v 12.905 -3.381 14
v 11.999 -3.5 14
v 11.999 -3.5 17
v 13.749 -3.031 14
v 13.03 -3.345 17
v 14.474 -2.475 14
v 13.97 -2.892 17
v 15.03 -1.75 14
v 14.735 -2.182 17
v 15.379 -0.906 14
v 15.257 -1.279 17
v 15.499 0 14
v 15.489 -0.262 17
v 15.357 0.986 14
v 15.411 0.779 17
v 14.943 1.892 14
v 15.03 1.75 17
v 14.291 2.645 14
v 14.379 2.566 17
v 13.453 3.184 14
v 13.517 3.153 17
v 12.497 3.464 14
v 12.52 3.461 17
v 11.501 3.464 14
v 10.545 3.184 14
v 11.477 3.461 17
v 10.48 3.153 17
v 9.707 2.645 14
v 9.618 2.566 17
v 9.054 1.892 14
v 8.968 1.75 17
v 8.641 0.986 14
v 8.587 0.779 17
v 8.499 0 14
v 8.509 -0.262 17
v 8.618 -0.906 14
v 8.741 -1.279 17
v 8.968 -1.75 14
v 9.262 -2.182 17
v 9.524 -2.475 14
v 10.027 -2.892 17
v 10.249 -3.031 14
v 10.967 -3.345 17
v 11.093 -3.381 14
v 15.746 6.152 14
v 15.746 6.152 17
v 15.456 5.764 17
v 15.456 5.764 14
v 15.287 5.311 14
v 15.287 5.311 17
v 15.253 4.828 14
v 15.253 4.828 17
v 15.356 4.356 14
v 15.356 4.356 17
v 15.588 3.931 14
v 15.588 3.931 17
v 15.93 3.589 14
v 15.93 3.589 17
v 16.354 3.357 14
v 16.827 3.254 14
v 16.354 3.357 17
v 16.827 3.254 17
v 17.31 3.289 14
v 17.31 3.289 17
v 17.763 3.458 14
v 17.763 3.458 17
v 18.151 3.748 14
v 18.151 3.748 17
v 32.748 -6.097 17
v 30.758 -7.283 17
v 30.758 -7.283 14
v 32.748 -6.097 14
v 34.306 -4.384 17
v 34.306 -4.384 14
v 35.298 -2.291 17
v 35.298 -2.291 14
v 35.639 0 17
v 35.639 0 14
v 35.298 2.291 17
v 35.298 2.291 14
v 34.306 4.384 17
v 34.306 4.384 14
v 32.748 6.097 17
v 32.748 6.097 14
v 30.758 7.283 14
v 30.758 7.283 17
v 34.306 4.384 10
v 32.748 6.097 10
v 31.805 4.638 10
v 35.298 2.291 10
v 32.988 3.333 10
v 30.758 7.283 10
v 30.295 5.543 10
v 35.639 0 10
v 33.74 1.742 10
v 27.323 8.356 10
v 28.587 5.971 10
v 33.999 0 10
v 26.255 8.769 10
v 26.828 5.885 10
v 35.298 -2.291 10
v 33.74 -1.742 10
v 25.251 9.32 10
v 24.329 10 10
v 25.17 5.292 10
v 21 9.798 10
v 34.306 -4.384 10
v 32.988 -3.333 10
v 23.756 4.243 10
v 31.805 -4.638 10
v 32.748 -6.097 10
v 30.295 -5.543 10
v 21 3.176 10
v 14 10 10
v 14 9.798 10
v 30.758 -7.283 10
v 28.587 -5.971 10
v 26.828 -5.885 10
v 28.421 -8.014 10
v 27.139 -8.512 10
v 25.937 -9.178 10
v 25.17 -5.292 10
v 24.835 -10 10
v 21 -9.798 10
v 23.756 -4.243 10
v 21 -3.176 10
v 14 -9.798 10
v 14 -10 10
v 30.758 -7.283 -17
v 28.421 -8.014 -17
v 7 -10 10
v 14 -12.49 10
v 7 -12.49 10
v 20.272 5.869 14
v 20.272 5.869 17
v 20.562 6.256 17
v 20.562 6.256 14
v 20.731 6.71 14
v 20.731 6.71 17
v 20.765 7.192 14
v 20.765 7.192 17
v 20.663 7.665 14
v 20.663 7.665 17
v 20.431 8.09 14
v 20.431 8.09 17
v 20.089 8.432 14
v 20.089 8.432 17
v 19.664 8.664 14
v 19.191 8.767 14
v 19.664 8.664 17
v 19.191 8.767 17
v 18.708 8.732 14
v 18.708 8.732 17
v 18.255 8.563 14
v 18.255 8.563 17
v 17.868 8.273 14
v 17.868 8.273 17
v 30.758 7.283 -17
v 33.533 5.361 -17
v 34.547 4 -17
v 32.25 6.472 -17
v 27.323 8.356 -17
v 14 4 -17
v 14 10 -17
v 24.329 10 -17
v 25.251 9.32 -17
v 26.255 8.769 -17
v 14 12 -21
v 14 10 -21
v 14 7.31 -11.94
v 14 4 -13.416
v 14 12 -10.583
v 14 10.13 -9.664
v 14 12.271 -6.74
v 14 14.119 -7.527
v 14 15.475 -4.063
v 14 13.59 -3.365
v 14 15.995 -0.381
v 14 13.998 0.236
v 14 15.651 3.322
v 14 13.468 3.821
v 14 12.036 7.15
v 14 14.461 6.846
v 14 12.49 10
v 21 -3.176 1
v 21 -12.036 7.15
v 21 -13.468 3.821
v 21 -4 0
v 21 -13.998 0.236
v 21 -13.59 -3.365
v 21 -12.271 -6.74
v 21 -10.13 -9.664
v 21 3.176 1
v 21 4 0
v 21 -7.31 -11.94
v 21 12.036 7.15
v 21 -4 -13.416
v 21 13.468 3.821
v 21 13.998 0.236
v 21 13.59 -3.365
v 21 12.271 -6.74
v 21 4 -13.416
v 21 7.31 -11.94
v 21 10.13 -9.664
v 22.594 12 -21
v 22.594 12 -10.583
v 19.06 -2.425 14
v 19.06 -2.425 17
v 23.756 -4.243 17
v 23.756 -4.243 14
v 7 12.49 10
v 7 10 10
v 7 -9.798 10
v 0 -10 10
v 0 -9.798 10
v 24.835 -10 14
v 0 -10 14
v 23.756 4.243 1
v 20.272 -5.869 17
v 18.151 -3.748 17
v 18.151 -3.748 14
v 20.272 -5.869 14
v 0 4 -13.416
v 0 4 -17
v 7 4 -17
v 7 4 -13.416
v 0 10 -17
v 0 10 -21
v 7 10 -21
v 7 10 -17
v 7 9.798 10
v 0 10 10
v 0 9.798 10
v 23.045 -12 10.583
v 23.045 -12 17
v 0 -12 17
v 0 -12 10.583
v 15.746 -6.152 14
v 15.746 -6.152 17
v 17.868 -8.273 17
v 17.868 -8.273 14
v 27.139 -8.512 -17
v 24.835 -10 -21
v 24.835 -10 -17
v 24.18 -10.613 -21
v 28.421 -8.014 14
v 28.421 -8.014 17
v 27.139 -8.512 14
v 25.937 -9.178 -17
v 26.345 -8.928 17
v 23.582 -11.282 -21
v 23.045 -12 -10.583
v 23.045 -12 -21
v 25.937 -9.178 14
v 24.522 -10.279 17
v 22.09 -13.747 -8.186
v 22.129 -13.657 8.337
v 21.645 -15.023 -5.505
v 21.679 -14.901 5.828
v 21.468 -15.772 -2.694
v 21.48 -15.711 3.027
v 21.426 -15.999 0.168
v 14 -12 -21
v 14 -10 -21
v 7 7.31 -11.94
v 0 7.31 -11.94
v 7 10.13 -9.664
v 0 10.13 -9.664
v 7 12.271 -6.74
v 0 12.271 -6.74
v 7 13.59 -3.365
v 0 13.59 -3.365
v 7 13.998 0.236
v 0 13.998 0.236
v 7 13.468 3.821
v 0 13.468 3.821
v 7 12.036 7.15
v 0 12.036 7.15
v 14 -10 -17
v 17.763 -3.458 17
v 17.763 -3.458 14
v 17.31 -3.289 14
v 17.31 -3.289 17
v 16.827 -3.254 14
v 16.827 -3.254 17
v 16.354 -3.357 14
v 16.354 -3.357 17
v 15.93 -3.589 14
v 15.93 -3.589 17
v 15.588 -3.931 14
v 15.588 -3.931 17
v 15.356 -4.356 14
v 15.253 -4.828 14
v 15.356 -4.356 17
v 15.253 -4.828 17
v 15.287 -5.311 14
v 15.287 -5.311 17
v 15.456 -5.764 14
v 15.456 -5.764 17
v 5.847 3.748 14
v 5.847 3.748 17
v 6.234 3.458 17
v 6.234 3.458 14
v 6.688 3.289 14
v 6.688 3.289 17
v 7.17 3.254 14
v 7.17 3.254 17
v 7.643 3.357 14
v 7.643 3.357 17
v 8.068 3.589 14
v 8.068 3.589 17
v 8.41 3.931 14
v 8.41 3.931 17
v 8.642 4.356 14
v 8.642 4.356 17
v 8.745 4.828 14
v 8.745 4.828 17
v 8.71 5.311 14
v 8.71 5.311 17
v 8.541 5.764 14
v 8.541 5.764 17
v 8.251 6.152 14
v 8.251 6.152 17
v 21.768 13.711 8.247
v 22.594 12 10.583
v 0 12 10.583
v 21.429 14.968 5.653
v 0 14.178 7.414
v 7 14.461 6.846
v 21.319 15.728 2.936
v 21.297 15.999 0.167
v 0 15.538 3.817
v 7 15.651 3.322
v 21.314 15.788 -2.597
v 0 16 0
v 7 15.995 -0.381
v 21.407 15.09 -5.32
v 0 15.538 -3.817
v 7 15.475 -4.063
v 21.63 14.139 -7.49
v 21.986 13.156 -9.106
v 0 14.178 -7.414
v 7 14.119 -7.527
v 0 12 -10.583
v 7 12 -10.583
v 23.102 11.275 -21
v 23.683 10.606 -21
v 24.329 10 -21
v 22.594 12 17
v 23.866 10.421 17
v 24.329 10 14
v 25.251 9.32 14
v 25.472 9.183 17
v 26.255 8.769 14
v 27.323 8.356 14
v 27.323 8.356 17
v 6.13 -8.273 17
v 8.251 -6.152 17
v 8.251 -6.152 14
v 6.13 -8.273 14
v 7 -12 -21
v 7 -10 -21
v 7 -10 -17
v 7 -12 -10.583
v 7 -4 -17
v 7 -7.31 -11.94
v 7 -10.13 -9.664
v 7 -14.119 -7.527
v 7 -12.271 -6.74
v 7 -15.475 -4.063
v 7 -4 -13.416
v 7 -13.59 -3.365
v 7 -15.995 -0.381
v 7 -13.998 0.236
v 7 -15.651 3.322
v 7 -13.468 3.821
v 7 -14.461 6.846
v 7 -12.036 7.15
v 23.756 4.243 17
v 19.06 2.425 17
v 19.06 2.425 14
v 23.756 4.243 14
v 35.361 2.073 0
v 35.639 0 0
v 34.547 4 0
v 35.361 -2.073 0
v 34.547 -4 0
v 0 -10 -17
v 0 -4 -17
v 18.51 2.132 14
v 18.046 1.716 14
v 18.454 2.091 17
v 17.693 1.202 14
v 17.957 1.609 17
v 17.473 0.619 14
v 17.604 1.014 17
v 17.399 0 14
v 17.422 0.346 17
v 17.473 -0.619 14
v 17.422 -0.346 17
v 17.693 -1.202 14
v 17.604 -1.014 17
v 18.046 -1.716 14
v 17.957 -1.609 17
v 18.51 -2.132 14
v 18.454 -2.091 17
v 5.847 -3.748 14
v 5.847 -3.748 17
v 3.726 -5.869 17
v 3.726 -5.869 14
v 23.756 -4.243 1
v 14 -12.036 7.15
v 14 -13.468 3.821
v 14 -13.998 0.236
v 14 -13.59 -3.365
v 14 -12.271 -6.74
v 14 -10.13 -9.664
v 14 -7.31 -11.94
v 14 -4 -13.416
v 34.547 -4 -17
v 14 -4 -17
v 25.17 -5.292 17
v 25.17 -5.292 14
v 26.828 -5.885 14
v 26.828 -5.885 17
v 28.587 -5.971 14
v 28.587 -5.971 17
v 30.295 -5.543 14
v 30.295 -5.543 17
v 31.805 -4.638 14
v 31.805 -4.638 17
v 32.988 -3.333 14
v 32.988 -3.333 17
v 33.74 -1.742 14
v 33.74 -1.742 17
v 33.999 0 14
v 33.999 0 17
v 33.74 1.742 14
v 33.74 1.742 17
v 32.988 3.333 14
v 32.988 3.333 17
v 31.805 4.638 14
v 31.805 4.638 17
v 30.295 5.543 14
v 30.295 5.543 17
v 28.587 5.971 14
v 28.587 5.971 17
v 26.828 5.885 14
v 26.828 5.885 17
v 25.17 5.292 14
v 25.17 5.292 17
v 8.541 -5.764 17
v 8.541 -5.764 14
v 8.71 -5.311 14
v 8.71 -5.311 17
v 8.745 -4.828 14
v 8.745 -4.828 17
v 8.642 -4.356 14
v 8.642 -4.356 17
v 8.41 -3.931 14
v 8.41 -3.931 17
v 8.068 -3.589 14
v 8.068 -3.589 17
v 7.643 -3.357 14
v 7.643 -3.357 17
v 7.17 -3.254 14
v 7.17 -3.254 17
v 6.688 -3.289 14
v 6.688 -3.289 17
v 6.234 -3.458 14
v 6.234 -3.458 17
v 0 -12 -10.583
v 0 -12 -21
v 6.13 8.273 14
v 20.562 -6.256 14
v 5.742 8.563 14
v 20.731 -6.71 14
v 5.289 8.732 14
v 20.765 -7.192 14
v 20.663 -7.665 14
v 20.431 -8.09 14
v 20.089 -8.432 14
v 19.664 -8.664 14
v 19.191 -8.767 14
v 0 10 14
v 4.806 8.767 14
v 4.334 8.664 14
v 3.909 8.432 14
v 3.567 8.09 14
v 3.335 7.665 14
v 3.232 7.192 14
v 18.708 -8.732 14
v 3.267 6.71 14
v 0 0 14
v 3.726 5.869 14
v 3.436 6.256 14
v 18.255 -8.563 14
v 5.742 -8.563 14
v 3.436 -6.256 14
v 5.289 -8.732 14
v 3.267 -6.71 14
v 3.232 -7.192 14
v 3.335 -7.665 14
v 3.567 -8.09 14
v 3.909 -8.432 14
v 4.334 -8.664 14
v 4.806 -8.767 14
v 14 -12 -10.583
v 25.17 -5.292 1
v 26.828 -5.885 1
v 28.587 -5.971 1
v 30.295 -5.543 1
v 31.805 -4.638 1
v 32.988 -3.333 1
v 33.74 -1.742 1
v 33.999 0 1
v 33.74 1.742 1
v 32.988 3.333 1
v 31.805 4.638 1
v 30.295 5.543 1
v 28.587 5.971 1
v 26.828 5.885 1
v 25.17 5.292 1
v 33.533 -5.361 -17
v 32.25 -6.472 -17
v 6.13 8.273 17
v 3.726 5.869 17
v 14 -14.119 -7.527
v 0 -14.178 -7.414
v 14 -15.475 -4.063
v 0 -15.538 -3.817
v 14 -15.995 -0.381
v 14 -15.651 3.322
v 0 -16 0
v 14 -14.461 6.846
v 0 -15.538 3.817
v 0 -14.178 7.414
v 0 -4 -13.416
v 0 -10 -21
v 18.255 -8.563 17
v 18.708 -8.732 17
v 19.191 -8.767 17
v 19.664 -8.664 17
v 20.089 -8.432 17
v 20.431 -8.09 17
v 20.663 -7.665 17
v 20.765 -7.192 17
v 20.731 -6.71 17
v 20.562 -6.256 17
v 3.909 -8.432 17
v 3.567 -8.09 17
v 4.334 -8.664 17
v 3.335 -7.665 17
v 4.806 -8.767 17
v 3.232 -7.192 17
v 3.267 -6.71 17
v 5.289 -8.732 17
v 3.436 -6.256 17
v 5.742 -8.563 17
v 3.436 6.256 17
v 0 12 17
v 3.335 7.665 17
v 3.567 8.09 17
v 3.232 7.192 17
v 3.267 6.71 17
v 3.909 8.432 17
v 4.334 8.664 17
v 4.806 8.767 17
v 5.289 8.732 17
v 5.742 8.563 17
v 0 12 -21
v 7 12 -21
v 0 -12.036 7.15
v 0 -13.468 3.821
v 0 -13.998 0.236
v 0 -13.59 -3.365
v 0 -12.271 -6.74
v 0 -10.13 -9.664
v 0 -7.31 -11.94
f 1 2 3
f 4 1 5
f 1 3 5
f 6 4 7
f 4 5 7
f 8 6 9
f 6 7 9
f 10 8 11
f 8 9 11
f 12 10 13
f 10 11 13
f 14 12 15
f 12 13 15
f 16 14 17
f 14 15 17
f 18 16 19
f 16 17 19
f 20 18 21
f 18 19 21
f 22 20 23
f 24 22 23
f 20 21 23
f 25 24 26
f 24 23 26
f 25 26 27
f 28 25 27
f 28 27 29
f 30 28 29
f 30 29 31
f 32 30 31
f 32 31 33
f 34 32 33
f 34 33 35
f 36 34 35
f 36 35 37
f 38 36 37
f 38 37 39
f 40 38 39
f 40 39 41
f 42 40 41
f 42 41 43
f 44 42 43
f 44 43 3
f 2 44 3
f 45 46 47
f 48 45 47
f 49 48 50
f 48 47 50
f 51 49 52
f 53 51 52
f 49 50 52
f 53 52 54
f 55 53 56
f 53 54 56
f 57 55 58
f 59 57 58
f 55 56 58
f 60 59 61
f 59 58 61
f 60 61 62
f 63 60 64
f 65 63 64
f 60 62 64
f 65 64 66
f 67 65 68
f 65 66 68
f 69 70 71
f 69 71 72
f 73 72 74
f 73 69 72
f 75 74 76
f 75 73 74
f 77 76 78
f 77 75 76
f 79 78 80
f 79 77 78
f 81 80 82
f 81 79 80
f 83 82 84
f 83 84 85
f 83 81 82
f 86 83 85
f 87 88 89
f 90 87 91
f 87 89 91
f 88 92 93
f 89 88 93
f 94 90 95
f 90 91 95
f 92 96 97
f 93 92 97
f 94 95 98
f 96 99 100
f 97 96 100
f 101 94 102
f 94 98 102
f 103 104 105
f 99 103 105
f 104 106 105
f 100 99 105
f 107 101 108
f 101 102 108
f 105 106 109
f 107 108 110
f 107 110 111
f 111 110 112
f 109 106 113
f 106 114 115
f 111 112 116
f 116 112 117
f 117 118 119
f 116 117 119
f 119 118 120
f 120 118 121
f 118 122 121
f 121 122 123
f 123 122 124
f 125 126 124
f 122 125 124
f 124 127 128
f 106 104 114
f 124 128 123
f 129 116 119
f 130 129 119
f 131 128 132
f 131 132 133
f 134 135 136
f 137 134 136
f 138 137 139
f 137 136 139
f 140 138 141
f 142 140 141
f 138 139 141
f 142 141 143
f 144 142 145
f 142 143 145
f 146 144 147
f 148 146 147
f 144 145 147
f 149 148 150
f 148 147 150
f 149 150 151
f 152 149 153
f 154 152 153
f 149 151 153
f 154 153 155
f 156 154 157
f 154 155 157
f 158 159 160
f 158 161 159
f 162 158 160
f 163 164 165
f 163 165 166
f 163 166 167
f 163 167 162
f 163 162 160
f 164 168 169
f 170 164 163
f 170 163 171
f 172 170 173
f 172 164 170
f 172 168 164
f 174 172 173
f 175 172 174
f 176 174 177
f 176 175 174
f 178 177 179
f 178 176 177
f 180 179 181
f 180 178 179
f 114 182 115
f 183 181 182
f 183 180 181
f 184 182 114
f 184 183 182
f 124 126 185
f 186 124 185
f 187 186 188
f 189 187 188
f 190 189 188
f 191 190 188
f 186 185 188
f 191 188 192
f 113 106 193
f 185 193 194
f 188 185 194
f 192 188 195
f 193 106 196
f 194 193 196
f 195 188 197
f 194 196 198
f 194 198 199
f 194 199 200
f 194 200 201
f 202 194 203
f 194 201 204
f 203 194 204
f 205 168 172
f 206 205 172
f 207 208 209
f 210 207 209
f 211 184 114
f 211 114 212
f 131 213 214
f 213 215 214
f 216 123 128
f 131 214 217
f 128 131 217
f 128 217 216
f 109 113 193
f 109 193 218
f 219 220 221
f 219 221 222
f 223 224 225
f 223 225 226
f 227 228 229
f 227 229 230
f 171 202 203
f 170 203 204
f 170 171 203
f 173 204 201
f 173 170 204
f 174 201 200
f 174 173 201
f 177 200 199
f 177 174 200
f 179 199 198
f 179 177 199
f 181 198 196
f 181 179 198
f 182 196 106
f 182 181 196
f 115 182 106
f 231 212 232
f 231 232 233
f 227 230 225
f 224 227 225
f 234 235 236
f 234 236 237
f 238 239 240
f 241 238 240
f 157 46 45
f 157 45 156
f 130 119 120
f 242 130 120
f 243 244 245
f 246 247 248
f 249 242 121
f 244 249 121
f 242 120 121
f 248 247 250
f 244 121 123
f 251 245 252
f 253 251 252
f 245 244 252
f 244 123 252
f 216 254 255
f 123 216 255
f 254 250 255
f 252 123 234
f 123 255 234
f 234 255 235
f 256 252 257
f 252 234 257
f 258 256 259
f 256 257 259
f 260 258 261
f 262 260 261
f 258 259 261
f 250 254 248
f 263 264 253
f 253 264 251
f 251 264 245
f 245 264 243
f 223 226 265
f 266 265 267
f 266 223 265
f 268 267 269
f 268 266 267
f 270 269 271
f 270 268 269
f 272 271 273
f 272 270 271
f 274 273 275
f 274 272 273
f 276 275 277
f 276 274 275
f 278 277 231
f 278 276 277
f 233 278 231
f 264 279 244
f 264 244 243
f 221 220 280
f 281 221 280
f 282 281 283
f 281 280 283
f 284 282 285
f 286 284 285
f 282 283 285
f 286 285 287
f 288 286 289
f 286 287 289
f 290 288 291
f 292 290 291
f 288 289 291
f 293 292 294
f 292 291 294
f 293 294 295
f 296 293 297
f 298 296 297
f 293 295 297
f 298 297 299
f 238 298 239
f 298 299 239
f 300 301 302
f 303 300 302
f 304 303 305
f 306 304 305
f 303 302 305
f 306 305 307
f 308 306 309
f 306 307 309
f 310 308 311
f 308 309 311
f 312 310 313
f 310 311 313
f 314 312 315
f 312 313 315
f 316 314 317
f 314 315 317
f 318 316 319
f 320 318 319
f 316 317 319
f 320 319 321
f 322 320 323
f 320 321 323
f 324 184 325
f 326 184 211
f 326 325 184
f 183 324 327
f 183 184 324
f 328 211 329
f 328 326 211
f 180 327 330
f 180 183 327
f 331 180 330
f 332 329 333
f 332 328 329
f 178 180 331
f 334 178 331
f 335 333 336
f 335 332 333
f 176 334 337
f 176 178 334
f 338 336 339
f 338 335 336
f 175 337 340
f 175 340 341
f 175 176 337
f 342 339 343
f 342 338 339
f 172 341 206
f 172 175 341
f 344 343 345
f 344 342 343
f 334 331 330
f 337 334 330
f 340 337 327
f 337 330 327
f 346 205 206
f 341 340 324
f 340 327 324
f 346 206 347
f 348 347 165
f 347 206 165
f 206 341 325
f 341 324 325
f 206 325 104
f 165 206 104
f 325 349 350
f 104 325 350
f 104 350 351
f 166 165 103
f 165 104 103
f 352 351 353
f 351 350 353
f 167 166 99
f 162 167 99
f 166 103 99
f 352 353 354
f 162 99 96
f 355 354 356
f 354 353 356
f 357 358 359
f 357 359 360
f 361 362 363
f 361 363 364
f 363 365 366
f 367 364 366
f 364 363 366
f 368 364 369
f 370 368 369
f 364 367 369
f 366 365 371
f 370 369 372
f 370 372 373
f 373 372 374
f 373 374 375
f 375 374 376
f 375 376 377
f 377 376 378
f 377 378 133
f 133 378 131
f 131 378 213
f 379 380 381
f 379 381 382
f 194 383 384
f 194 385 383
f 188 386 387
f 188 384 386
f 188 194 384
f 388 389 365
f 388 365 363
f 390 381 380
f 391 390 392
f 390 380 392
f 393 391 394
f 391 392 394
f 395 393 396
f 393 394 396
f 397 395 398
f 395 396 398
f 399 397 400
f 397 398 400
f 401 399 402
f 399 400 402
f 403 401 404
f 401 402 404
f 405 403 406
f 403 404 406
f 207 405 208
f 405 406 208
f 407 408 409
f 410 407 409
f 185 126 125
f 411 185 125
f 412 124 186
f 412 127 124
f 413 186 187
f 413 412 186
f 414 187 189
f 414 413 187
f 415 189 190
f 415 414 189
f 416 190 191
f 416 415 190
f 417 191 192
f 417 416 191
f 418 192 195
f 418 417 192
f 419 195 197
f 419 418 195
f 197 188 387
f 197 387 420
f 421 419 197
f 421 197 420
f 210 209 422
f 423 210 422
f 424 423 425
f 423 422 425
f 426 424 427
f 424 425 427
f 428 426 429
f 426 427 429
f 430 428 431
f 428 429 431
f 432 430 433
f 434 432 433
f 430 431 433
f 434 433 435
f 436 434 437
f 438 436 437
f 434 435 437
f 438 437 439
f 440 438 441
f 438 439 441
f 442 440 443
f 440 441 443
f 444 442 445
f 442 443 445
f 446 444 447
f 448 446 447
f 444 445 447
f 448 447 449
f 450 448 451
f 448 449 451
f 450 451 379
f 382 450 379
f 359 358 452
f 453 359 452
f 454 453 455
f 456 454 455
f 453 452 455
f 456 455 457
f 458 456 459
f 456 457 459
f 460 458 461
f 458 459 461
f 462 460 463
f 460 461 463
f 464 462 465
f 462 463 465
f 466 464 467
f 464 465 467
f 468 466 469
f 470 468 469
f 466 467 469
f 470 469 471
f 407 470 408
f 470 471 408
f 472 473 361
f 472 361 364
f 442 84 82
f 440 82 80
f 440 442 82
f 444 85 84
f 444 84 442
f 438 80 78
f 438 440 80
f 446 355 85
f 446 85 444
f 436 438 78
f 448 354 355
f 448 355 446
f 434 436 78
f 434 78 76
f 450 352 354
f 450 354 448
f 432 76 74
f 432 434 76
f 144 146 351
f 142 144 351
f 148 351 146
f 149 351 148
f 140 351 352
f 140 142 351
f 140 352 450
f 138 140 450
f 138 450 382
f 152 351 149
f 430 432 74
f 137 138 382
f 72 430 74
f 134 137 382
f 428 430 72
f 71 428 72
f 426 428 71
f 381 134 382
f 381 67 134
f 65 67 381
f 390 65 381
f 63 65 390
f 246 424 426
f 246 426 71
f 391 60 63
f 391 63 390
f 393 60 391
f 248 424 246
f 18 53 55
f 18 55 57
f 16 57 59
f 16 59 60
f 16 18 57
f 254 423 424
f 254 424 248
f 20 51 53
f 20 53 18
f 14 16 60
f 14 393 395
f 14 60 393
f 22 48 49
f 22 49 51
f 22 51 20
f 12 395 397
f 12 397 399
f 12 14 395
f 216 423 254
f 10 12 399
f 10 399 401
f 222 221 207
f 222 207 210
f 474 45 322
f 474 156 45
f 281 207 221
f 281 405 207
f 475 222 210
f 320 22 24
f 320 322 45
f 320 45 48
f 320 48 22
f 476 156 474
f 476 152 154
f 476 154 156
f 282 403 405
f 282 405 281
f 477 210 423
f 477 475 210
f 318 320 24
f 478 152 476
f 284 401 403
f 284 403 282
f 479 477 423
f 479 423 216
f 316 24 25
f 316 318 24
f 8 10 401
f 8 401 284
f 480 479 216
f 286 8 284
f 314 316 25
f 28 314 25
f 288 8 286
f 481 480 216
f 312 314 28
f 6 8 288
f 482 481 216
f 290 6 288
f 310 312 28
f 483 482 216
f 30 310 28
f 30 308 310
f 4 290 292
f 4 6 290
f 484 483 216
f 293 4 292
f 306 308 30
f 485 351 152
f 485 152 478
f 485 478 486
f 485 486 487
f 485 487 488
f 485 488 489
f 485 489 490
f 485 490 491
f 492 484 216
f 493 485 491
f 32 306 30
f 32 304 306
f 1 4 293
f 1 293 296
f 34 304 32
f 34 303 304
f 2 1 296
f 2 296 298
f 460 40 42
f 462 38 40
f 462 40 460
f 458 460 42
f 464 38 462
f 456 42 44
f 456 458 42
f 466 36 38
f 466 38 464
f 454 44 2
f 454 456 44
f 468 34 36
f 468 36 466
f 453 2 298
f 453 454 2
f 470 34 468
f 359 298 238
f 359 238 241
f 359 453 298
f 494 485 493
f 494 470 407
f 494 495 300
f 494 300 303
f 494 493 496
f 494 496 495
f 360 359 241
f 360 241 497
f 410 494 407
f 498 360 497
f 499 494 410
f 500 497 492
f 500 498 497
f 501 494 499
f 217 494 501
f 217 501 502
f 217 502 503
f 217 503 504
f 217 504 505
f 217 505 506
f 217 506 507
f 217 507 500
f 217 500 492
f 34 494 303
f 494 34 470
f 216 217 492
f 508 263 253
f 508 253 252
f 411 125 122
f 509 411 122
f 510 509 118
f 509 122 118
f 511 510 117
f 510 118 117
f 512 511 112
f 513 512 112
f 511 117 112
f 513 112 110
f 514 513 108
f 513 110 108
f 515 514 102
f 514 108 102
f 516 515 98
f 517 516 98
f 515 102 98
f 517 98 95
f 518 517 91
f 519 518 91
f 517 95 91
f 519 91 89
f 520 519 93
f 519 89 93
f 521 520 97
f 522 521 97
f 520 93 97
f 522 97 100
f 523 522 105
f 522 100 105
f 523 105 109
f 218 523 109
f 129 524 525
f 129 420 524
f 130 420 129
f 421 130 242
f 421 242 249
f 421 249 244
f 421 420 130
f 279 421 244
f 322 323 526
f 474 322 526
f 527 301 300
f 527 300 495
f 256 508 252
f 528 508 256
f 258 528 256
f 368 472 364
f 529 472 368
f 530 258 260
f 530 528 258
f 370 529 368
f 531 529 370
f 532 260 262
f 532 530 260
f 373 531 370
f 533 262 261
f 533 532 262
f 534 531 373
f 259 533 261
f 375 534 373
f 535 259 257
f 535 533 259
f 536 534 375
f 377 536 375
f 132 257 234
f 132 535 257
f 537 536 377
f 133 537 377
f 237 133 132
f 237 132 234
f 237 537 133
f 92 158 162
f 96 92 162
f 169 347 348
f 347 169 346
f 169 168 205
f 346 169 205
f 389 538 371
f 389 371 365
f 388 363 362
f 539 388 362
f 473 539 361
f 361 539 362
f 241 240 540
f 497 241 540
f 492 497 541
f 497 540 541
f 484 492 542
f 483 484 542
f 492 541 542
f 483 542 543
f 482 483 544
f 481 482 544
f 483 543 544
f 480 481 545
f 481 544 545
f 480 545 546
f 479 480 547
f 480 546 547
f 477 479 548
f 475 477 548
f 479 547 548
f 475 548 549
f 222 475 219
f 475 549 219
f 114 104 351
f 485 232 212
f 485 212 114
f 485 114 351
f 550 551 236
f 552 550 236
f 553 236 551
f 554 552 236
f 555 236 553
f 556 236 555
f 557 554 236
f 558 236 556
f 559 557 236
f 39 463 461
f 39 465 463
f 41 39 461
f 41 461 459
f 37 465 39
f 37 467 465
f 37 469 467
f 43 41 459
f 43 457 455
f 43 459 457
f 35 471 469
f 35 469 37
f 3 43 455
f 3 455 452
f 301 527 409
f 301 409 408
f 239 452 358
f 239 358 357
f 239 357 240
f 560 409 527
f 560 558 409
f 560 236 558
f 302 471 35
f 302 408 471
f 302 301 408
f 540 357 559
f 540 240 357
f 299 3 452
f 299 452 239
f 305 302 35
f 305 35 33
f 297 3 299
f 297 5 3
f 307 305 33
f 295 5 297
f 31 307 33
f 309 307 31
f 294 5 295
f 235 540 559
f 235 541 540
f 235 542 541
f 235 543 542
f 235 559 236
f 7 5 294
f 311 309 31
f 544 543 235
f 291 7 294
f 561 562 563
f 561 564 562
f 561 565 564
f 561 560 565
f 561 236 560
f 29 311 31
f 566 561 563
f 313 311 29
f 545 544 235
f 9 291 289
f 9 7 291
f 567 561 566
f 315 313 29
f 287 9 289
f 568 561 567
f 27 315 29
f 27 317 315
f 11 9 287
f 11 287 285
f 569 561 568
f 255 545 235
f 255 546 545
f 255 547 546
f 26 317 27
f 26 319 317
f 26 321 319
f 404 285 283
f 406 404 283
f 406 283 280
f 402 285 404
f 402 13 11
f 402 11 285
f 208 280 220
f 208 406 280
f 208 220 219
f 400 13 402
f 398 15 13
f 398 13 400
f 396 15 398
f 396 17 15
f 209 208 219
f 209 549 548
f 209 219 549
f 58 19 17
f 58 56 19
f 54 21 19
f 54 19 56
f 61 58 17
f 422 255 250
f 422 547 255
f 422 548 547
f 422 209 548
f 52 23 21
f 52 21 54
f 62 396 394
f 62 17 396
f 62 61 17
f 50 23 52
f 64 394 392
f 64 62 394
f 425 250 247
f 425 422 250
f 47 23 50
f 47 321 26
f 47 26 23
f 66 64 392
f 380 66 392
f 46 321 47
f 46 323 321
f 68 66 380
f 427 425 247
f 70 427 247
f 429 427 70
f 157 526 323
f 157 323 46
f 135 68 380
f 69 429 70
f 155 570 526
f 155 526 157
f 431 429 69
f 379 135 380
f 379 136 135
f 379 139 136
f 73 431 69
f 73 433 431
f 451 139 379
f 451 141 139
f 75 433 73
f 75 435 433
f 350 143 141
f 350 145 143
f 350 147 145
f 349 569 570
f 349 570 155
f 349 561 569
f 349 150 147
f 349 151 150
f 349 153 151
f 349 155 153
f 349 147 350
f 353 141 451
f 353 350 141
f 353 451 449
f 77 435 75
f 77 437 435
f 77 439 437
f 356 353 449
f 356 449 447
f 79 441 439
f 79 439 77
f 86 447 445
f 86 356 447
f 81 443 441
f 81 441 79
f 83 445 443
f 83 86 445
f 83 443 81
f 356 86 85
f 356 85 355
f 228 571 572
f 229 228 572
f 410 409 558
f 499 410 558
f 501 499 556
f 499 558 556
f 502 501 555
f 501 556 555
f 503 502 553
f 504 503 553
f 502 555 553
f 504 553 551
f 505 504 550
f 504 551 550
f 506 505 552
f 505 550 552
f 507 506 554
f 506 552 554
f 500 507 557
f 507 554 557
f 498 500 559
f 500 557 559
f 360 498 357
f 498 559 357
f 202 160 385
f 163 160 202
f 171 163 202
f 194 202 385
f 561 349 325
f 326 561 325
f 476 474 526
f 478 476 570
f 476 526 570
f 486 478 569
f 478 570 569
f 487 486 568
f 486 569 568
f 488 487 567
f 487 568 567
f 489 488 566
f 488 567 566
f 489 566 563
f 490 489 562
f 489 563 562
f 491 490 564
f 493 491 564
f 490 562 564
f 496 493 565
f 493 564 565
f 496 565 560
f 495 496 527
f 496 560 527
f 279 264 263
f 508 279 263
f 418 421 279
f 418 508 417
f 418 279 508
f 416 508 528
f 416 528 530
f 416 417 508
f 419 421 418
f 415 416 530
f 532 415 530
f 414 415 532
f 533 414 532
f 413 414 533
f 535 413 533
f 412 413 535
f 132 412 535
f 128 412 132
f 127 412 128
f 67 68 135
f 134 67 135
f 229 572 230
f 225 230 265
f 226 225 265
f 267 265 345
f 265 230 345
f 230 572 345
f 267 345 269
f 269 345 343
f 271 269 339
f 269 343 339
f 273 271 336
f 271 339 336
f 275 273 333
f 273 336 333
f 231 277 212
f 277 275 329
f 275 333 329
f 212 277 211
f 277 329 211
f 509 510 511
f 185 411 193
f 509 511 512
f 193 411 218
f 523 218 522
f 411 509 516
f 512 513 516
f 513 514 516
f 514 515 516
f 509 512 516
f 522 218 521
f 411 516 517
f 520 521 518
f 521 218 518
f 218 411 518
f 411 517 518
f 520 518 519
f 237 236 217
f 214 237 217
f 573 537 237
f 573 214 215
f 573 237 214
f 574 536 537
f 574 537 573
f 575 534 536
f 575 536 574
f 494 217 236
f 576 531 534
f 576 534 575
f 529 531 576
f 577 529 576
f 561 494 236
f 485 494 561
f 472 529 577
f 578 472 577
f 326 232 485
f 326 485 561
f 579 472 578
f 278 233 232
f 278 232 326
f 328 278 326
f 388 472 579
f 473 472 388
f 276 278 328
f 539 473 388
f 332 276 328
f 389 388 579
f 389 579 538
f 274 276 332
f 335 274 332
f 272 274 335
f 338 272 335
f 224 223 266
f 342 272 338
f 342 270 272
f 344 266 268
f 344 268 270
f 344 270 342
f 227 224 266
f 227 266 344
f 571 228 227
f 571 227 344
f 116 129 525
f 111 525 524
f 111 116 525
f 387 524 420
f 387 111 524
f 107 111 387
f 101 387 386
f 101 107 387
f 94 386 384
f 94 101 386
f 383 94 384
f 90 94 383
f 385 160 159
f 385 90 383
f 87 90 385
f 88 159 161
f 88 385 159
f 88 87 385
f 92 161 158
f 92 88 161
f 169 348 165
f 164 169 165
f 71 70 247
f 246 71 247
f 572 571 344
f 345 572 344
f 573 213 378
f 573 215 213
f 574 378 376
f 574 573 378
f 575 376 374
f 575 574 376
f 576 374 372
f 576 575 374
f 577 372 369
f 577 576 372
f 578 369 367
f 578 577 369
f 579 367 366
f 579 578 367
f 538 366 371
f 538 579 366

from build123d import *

# Parameters (mm, degrees)
EXTRUDE_DEPTH                             = 50
SKETCH004_AS_DRAWN_R                      = 3.5
EXTRUDE003_DEPTH                          = 16
EXTRUDE003_ONTO_SKETCH004_PLACEMENT_ANGLE = -90
SKETCH002_AS_DRAWN_W                      = 7
SKETCH002_AS_DRAWN_H                      = 55
EXTRUDE002_DEPTH                          = 50
EXTRUDE002_ONTO_SKETCH002_ROLL_ANGLE      = 90
EXTRUDE002_ONTO_SKETCH002_PLACEMENT_ANGLE = 180
SKETCH001_W                               = 20
SKETCH001_H                               = 4
EXTRUDE004_DEPTH                          = 40
CYLINDER_R                                = 14
CYLINDER_DEPTH                            = 21
CYLINDER_PITCH_ANGLE                      = 90
BOX_W                                     = 40
BOX_H                                     = 40
BOX_DEPTH                                 = 38


with BuildPart() as extrude_body:
    # Sketch → Extrude (new body)
    with BuildSketch(Plane.XY.offset(17)):
        with BuildLine():
            ThreePointArc((30.758472, -7.283122), (35.638931, 0), (30.758472, 7.283122))
            Line((30.758472, 7.283122), (27.322862, 8.355563))
            ThreePointArc((21.27771, 16.575411), (22.951713, 11.473701), (27.322862, 8.355563))
            Line((21.27771, 32.499498), (21.27771, 16.575411))
            Line((57.622795, 32.499498), (21.27771, 32.499498))
            Line((57.622795, -32.499498), (57.622795, 32.499498))
            Line((21.27771, -32.499498), (57.622795, -32.499498))
            Line((21.27771, -17.732402), (21.27771, -32.499498))
            ThreePointArc((28.420512, -8.014357), (23.25549, -11.702062), (21.27771, -17.732402))
            Line((30.758472, -7.283122), (28.420512, -8.014357))
        make_face()
    extrude(amount=-EXTRUDE_DEPTH)


with BuildPart() as motor_mount_sketch_extrude:
    # Sketch004 as drawn → Extrude003 (new)
    with BuildSketch(Plane.XY):
        with Locations((0, 15.99875)):
            Circle(SKETCH004_AS_DRAWN_R)
        with BuildLine():
            ThreePointArc((-6.151829, 19.746416), (-3.747666, 19.746416), (-3.747666, 22.150579))
            Line((-3.747666, 22.150579), (-5.868986, 24.271899))
            ThreePointArc((-5.868986, 24.271899), (-8.273149, 24.271899), (-8.273149, 21.867736))
            Line((-6.151829, 19.746416), (-8.273149, 21.867736))
        make_face()
        with BuildLine():
            ThreePointArc((-3.747666, 9.846921), (-3.747666, 12.251084), (-6.151829, 12.251084))
            Line((-6.151829, 12.251084), (-8.273149, 10.129764))
            ThreePointArc((-8.273149, 10.129764), (-8.273149, 7.725601), (-5.868986, 7.725601))
            Line((-3.747666, 9.846921), (-5.868986, 7.725601))
        make_face()
        with BuildLine():
            ThreePointArc((6.151829, 12.251084), (3.747666, 12.251084), (3.747666, 9.846921))
            Line((3.747666, 9.846921), (5.868986, 7.725601))
            ThreePointArc((5.868986, 7.725601), (8.273149, 7.725601), (8.273149, 10.129764))
            Line((6.151829, 12.251084), (8.273149, 10.129764))
        make_face()
        with BuildLine():
            ThreePointArc((3.747666, 22.150579), (3.747666, 19.746416), (6.151829, 19.746416))
            Line((6.151829, 19.746416), (8.273149, 21.867736))
            ThreePointArc((8.273149, 21.867736), (8.273149, 24.271899), (5.868986, 24.271899))
            Line((3.747666, 22.150579), (5.868986, 24.271899))
        make_face()
        with BuildLine():
            Line((-2.424646, 23.060085), (-4.242641, 27.756109))
            ThreePointArc((4.242641, 27.756109), (0, 37.99875), (-4.242641, 27.756109))
            Line((2.424646, 23.060085), (4.242641, 27.756109))
            ThreePointArc((-2.424646, 23.060085), (0, 21.39875), (2.424646, 23.060085))
        make_face()
    extrude(amount=-EXTRUDE003_DEPTH)


with BuildPart() as motor_mount_sketch_extrude_1:
    # Extrude003 onto Sketch004 placement: moved
    add(motor_mount_sketch_extrude.part.moved(Location((-4, 0, 17))).rotate(Axis((-4, 0, 17), (0, 0, 1)), EXTRUDE003_ONTO_SKETCH004_PLACEMENT_ANGLE))


with BuildPart() as side_cute_lite_extrude:
    # Sketch002 as drawn → Extrude002 (new)
    with BuildSketch(Plane.XY):
        with Locations((-10.5, -17.5)):
            Rectangle(SKETCH002_AS_DRAWN_W, SKETCH002_AS_DRAWN_H)
    extrude(amount=-EXTRUDE002_DEPTH)


with BuildPart() as side_cute_lite_extrude_1:
    # Extrude002 onto Sketch002 roll: moved
    add(side_cute_lite_extrude.part.rotate(Axis((0, 0, 0), (1, 0, 0)), EXTRUDE002_ONTO_SKETCH002_ROLL_ANGLE))


with BuildPart() as side_cute_lite_extrude_2:
    # Extrude002 onto Sketch002 placement: moved
    add(side_cute_lite_extrude_1.part.moved(Location((0, 23, 0))).rotate(Axis((0, 23, 0), (0, 0, 1)), EXTRUDE002_ONTO_SKETCH002_PLACEMENT_ANGLE))


with BuildPart() as outer_tube_profile_extrude:
    # Sketch001 → Extrude004 (new body)
    with BuildSketch(Plane(origin=(0, 0, 0), x_dir=(0, -1, 0), z_dir=(-1, 0, 0))):
        with BuildLine():
            Line((-12, 20), (-12, 10.583005))
            ThreePointArc((-12, 10.583005), (-16, 0), (-12, -10.583005))
            Line((-12, -35), (-12, -10.583005))
            Line((-32, -35), (-12, -35))
            Line((-32, 20), (-32, -35))
            Line((-12, 20), (-32, 20))
        make_face()
        with BuildLine():
            ThreePointArc((12, -10.583005), (16, 0), (12, 10.583005))
            Line((12, 20), (12, 10.583005))
            Line((12, 20), (32, 20))
            Line((32, 20), (32, -35))
            Line((32, -35), (12, -35))
            Line((12, -35), (12, -10.583005))
        make_face()
        Polygon((-4, 0), (4, 0), (4, -17), (10, -17), (10, -35), (-10, -35), (-10, -17), (-4, -17), align=None)
        with Locations((0, 12)):
            Rectangle(SKETCH001_W, SKETCH001_H)
    extrude(amount=-EXTRUDE004_DEPTH)


with BuildPart() as cylinder:
    # Cylinder → Cylinder (new body)
    with BuildSketch(Plane.XY):
        Circle(CYLINDER_R)
    extrude(amount=CYLINDER_DEPTH)


with BuildPart() as cylinder_1:
    # Cylinder pitch: moved
    add(cylinder.part.rotate(Axis((0, 0, 0), (0, 1, 0)), CYLINDER_PITCH_ANGLE))


with BuildPart() as cylinder_2:
    # Cylinder placement: moved
    add(cylinder_1.part)


with BuildPart() as cut004:
    # Box → Box (new body)
    with BuildSketch(Plane(origin=(0, -20, -21), x_dir=(1, 0, 0), z_dir=(0, 0, 1))):
        with Locations((20, 20)):
            Rectangle(BOX_W, BOX_H)
    extrude(amount=BOX_DEPTH)

    # Cut: cut Cylinder
    add(cylinder_2.part, mode=Mode.SUBTRACT)

    # Cut001: cut Outer_tube_profile_extrude
    add(outer_tube_profile_extrude.part, mode=Mode.SUBTRACT)

    # Cut002: cut Side_cute_lite_extrude
    add(side_cute_lite_extrude_2.part, mode=Mode.SUBTRACT)

    # Cut003: cut motor_mount_sketch_extrude
    add(motor_mount_sketch_extrude_1.part, mode=Mode.SUBTRACT)

    # Cut004: cut Extrude body
    add(extrude_body.part, mode=Mode.SUBTRACT)


solid = cut004.part
